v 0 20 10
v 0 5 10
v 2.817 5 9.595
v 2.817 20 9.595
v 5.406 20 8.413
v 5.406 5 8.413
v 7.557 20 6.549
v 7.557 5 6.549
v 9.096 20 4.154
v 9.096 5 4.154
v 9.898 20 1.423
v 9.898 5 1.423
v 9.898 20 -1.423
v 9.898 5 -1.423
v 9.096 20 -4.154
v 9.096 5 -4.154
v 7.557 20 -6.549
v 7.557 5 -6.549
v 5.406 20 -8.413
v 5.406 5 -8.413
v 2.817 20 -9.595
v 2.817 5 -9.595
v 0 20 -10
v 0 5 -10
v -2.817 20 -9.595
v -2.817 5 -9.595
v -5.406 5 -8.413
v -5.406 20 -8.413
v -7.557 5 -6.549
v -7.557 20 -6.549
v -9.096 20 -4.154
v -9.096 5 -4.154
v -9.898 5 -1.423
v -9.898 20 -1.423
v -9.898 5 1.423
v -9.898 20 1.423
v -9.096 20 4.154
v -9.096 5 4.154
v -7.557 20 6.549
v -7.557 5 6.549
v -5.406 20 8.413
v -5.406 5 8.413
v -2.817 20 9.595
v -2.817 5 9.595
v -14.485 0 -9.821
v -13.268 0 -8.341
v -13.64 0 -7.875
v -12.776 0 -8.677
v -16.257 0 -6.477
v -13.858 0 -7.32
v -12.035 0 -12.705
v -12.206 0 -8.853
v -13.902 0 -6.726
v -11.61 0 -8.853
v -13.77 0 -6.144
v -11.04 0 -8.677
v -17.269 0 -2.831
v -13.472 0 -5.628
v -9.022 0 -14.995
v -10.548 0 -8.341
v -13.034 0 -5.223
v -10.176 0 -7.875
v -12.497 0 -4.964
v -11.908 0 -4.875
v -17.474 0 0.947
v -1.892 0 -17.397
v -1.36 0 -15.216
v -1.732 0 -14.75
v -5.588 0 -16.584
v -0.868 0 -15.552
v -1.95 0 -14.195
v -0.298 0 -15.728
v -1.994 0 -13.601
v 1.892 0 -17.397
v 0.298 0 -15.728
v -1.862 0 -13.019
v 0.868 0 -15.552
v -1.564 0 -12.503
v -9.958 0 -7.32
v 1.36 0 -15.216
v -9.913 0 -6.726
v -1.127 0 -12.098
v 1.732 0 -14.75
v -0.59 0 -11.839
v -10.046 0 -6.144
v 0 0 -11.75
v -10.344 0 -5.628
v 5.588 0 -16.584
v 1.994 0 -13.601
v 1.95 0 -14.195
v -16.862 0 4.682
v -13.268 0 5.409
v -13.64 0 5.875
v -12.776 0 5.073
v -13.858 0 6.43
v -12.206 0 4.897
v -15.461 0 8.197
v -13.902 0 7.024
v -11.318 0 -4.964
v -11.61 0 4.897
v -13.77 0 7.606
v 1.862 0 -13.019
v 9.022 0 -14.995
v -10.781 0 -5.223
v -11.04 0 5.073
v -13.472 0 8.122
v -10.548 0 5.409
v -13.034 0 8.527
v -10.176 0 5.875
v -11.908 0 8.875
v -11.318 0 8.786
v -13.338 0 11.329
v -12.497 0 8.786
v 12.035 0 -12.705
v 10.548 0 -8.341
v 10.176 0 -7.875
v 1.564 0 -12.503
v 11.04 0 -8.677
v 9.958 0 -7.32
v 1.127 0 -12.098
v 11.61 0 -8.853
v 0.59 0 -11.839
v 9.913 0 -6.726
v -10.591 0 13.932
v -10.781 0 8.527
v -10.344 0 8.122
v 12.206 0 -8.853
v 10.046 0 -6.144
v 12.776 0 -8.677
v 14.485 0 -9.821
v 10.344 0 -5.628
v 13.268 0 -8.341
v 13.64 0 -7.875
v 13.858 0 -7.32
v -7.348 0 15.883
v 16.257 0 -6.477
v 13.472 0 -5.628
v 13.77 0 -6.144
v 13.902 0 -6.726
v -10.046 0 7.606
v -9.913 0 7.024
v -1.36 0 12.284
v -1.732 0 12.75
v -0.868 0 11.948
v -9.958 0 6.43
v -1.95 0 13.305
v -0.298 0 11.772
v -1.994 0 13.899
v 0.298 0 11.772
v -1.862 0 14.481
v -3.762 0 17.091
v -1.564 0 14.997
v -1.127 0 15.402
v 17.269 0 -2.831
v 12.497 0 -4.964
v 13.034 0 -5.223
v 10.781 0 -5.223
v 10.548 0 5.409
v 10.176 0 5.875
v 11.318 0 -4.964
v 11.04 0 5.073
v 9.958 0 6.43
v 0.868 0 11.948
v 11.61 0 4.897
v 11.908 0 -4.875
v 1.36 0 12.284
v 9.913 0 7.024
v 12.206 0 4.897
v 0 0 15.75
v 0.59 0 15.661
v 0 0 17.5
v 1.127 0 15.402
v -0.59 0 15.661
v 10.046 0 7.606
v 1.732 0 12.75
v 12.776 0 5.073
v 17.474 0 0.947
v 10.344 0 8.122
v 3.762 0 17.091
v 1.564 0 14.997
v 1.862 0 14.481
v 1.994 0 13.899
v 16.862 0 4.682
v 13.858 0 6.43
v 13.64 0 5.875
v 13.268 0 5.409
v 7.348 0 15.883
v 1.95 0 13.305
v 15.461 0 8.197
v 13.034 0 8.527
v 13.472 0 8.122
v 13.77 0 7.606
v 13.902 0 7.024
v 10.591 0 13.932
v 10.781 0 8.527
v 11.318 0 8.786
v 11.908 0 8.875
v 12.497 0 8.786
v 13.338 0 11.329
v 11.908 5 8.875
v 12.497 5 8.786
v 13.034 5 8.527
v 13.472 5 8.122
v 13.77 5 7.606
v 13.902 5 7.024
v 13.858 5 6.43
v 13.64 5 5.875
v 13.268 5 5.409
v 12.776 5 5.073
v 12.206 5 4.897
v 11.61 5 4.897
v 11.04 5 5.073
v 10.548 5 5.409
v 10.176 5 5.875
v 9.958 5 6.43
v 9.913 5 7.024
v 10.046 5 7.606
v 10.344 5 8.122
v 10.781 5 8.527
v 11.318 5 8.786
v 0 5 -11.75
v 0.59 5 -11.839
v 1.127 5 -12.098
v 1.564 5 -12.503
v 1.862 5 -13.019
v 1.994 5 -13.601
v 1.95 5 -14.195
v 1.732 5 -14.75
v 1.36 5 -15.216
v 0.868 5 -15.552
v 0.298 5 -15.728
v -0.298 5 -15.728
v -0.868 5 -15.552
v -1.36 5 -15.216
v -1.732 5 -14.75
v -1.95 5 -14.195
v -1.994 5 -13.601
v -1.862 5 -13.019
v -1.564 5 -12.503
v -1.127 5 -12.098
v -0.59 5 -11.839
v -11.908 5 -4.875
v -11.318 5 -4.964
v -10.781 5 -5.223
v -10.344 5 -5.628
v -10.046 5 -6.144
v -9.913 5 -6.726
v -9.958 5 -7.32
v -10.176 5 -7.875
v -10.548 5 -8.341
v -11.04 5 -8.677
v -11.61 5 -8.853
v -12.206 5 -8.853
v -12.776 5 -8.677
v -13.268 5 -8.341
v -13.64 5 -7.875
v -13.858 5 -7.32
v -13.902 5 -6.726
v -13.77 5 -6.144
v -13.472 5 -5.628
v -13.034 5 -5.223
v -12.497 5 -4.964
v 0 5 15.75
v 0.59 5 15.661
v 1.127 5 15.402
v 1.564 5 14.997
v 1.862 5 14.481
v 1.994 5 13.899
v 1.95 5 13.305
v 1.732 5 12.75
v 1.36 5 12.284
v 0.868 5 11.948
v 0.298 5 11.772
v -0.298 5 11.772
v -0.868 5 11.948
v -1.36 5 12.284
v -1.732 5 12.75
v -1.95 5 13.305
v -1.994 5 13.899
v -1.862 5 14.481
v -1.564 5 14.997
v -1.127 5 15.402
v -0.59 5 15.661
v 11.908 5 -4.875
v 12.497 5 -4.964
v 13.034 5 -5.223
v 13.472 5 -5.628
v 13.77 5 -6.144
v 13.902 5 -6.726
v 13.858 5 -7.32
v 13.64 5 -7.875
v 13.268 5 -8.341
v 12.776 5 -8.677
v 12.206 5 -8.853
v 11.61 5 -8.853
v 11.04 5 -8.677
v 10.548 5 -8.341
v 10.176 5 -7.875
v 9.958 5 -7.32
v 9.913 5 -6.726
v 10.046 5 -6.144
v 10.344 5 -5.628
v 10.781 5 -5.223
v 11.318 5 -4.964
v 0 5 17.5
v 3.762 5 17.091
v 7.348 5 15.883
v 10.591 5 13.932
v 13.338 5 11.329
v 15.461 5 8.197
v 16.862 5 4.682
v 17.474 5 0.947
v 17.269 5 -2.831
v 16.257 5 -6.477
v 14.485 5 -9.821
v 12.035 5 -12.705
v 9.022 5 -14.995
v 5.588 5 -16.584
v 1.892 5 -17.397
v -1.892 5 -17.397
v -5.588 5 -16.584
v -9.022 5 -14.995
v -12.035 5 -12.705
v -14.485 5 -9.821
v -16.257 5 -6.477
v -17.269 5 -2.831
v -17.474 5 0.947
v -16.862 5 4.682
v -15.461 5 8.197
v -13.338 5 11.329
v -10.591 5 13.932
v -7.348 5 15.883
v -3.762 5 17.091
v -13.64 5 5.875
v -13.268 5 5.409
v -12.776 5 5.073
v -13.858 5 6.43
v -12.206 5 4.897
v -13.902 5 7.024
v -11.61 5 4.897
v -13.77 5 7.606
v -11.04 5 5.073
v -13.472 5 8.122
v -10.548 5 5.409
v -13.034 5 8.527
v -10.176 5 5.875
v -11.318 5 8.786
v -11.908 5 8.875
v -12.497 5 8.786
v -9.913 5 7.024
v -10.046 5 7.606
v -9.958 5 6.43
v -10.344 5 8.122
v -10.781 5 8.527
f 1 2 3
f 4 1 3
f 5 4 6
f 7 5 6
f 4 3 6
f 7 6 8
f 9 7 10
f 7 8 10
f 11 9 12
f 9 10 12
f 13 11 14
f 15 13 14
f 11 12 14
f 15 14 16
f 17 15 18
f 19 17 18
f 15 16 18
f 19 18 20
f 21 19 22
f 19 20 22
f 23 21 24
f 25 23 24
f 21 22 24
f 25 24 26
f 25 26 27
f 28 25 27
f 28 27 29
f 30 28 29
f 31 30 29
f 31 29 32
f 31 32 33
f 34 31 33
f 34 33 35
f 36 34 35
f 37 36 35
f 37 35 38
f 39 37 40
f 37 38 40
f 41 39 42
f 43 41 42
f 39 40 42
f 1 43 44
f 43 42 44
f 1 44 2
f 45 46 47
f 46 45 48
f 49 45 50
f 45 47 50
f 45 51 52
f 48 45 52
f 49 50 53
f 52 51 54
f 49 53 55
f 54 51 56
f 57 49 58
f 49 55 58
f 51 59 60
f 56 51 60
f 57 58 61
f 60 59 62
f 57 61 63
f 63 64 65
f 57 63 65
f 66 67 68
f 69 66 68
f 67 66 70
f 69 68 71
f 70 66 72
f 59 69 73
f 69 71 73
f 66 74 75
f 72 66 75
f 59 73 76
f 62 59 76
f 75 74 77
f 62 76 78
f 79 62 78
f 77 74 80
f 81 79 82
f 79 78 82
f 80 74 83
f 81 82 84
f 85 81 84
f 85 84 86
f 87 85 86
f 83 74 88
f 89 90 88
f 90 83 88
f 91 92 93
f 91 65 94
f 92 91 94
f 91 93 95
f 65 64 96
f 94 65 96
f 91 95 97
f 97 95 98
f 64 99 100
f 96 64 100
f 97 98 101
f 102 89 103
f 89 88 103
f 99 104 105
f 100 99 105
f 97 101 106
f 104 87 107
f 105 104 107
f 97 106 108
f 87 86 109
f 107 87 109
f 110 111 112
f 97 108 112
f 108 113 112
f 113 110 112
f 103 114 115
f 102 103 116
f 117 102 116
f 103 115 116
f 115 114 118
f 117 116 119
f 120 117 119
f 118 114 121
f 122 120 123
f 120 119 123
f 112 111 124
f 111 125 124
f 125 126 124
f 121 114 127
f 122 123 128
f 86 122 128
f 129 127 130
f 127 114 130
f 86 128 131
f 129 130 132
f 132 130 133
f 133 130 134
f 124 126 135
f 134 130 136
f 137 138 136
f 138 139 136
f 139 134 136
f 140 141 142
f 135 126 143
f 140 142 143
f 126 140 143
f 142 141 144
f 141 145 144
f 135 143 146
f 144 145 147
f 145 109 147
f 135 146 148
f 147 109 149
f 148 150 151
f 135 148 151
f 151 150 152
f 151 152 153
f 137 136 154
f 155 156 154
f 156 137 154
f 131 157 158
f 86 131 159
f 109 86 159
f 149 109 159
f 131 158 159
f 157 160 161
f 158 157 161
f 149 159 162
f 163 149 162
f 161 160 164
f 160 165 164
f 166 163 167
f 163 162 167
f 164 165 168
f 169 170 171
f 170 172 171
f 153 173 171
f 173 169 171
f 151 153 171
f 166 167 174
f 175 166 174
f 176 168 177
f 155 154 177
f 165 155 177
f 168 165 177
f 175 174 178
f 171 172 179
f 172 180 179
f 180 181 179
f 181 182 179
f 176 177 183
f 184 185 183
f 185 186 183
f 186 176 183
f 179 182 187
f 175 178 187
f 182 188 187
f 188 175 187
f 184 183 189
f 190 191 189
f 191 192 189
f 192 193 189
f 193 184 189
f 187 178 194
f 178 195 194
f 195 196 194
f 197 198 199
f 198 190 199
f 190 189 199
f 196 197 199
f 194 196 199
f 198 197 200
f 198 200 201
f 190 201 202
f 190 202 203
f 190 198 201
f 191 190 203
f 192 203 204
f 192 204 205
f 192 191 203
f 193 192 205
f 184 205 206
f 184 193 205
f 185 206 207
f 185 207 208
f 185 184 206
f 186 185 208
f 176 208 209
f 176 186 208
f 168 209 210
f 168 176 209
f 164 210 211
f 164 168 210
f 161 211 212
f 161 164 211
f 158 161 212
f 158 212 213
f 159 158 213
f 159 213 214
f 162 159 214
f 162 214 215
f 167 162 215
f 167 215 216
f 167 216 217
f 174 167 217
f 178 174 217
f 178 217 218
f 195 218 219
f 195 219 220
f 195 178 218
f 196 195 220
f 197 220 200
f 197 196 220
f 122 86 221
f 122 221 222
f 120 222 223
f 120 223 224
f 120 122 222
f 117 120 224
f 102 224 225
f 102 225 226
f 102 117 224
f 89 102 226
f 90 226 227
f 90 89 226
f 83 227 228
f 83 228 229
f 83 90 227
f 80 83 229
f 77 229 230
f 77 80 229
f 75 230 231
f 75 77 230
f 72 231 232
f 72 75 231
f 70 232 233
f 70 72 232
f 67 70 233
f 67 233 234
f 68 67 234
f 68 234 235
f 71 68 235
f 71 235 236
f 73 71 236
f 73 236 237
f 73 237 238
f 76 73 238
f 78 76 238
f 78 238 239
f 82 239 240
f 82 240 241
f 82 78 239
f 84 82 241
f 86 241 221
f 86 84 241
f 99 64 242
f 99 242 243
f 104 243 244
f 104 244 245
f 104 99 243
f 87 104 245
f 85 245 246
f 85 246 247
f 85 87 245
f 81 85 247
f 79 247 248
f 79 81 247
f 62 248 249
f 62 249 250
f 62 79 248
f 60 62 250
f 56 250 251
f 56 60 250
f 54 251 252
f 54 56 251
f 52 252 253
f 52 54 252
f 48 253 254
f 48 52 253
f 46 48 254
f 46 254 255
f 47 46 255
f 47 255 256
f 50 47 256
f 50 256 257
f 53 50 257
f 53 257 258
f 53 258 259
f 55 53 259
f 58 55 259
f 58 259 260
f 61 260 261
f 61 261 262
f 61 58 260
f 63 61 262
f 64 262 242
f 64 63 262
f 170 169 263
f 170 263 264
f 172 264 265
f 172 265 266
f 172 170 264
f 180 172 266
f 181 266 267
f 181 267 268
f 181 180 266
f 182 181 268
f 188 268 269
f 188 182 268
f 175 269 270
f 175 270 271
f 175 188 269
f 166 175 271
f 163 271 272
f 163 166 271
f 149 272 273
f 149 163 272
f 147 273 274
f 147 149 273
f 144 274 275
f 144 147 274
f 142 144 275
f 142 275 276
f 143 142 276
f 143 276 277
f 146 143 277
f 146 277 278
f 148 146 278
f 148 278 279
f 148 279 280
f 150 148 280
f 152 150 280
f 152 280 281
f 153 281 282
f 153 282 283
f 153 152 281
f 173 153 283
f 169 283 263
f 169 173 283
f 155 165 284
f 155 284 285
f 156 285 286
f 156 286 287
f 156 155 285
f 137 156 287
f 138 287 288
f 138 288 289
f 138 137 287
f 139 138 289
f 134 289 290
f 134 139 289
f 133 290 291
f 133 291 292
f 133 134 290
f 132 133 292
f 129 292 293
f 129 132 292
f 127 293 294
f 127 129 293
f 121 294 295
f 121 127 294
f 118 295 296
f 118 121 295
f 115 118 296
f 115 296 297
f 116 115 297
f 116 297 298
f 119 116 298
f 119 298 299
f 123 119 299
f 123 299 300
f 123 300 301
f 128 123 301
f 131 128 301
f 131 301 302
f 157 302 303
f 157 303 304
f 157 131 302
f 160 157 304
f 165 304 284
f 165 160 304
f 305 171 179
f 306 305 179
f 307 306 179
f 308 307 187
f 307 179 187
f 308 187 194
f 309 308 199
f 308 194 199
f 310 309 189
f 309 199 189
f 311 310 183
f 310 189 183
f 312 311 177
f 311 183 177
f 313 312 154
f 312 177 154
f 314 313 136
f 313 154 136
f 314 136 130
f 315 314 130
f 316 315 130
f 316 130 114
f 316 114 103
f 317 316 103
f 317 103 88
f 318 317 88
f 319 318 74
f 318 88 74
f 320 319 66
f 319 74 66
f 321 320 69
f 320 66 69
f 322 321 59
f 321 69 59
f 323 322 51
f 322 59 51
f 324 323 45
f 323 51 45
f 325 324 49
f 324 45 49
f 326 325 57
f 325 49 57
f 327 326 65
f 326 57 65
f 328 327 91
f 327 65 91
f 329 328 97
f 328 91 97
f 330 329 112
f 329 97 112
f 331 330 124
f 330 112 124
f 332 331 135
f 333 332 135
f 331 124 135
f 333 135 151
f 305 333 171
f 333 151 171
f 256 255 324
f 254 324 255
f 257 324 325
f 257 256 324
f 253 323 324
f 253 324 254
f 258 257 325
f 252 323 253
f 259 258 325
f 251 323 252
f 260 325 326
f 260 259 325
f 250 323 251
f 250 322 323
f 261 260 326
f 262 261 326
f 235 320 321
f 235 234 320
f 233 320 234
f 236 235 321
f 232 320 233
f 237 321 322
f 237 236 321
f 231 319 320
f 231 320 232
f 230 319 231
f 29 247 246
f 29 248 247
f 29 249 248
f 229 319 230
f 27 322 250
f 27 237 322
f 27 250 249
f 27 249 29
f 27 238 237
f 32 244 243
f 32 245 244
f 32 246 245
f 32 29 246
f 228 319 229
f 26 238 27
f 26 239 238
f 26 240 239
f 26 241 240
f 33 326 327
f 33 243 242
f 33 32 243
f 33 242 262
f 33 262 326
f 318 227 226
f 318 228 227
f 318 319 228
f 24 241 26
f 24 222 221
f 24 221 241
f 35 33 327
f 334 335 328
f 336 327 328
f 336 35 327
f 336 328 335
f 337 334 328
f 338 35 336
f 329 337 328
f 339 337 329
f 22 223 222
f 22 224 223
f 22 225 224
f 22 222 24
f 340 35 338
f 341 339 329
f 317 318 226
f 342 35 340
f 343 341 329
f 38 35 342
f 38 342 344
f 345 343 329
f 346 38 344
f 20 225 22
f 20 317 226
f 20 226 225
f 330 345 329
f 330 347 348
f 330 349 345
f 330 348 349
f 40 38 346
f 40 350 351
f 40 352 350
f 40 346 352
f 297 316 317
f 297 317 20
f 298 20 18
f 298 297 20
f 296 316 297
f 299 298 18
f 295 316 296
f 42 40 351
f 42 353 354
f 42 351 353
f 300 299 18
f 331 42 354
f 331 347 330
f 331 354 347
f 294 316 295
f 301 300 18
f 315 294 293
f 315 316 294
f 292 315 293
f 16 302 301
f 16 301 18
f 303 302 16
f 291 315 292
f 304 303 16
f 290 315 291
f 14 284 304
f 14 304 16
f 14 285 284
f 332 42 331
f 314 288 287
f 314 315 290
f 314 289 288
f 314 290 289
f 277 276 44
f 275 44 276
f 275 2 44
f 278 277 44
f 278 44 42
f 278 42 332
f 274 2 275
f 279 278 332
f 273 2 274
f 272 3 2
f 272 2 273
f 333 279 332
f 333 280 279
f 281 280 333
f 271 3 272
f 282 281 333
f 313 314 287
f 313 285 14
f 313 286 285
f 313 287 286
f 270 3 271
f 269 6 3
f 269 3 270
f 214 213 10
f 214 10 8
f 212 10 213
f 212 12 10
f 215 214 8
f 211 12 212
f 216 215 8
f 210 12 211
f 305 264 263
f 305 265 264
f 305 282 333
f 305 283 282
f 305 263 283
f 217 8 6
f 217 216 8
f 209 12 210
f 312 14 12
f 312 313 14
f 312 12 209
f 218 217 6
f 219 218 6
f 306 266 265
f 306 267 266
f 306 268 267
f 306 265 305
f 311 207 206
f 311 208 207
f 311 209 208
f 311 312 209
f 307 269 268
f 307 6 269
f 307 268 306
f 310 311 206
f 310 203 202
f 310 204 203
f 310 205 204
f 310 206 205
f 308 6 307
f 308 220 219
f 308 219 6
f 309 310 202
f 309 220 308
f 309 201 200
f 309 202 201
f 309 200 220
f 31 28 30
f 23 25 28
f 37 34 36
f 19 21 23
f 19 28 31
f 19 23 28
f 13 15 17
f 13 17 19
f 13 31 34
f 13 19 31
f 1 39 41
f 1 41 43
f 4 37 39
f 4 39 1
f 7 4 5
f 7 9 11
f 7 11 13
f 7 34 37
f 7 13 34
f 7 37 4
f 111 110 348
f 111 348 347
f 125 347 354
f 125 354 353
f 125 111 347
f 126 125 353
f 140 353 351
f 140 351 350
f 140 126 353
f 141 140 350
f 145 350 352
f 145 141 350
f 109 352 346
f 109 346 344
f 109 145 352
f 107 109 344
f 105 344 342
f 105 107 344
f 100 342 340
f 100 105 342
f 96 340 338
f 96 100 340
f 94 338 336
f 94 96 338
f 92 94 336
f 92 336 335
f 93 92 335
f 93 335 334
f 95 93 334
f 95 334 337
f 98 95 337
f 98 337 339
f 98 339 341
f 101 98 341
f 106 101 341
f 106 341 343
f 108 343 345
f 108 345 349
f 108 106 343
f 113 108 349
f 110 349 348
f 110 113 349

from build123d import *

# Parameters (mm, degrees)
SKETCH2_R           = 17.5
SKETCH2_R_2         = 2
BOSS_EXTRUDE1_DEPTH = 5
SKETCH3_R           = 10
BOSS_EXTRUDE2_DEPTH = 15


with BuildPart() as part:
    # Sketch2 → Boss-Extrude1 (new body)
    with BuildSketch(Plane(origin=(0, 0, 0), x_dir=(1, 0, 0), z_dir=(0, 1, 0))):
        with Locations(Location((0, 0, 0), (0, 0, 270))):
            Circle(SKETCH2_R)
        with Locations(Location((0, 13.75, 0), (0, 0, 270))):
            Circle(SKETCH2_R_2, mode=Mode.SUBTRACT)
        with Locations(Location((11.907849302, 6.875, 0), (0, 0, 270))):
            Circle(SKETCH2_R_2, mode=Mode.SUBTRACT)
        with Locations(Location((11.907849302, -6.875, 0), (0, 0, 270))):
            Circle(SKETCH2_R_2, mode=Mode.SUBTRACT)
        with Locations(Location((0, -13.75, 0), (0, 0, 270))):
            Circle(SKETCH2_R_2, mode=Mode.SUBTRACT)
        with Locations(Location((-11.907849302, -6.875, 0), (0, 0, 270))):
            Circle(SKETCH2_R_2, mode=Mode.SUBTRACT)
        with Locations(Location((-11.907849302, 6.875, 0), (0, 0, 270))):
            Circle(SKETCH2_R_2, mode=Mode.SUBTRACT)
    extrude(amount=BOSS_EXTRUDE1_DEPTH)

    # Sketch3 → Boss-Extrude2 (add)
    with BuildSketch(Plane(origin=(0, 5, 0), x_dir=(1, 0, 0), z_dir=(0, 1, 0))):
        with Locations(Location((0, 0, 0), (0, 0, 270))):
            Circle(SKETCH3_R)
    extrude(amount=BOSS_EXTRUDE2_DEPTH)


solid = part.part
